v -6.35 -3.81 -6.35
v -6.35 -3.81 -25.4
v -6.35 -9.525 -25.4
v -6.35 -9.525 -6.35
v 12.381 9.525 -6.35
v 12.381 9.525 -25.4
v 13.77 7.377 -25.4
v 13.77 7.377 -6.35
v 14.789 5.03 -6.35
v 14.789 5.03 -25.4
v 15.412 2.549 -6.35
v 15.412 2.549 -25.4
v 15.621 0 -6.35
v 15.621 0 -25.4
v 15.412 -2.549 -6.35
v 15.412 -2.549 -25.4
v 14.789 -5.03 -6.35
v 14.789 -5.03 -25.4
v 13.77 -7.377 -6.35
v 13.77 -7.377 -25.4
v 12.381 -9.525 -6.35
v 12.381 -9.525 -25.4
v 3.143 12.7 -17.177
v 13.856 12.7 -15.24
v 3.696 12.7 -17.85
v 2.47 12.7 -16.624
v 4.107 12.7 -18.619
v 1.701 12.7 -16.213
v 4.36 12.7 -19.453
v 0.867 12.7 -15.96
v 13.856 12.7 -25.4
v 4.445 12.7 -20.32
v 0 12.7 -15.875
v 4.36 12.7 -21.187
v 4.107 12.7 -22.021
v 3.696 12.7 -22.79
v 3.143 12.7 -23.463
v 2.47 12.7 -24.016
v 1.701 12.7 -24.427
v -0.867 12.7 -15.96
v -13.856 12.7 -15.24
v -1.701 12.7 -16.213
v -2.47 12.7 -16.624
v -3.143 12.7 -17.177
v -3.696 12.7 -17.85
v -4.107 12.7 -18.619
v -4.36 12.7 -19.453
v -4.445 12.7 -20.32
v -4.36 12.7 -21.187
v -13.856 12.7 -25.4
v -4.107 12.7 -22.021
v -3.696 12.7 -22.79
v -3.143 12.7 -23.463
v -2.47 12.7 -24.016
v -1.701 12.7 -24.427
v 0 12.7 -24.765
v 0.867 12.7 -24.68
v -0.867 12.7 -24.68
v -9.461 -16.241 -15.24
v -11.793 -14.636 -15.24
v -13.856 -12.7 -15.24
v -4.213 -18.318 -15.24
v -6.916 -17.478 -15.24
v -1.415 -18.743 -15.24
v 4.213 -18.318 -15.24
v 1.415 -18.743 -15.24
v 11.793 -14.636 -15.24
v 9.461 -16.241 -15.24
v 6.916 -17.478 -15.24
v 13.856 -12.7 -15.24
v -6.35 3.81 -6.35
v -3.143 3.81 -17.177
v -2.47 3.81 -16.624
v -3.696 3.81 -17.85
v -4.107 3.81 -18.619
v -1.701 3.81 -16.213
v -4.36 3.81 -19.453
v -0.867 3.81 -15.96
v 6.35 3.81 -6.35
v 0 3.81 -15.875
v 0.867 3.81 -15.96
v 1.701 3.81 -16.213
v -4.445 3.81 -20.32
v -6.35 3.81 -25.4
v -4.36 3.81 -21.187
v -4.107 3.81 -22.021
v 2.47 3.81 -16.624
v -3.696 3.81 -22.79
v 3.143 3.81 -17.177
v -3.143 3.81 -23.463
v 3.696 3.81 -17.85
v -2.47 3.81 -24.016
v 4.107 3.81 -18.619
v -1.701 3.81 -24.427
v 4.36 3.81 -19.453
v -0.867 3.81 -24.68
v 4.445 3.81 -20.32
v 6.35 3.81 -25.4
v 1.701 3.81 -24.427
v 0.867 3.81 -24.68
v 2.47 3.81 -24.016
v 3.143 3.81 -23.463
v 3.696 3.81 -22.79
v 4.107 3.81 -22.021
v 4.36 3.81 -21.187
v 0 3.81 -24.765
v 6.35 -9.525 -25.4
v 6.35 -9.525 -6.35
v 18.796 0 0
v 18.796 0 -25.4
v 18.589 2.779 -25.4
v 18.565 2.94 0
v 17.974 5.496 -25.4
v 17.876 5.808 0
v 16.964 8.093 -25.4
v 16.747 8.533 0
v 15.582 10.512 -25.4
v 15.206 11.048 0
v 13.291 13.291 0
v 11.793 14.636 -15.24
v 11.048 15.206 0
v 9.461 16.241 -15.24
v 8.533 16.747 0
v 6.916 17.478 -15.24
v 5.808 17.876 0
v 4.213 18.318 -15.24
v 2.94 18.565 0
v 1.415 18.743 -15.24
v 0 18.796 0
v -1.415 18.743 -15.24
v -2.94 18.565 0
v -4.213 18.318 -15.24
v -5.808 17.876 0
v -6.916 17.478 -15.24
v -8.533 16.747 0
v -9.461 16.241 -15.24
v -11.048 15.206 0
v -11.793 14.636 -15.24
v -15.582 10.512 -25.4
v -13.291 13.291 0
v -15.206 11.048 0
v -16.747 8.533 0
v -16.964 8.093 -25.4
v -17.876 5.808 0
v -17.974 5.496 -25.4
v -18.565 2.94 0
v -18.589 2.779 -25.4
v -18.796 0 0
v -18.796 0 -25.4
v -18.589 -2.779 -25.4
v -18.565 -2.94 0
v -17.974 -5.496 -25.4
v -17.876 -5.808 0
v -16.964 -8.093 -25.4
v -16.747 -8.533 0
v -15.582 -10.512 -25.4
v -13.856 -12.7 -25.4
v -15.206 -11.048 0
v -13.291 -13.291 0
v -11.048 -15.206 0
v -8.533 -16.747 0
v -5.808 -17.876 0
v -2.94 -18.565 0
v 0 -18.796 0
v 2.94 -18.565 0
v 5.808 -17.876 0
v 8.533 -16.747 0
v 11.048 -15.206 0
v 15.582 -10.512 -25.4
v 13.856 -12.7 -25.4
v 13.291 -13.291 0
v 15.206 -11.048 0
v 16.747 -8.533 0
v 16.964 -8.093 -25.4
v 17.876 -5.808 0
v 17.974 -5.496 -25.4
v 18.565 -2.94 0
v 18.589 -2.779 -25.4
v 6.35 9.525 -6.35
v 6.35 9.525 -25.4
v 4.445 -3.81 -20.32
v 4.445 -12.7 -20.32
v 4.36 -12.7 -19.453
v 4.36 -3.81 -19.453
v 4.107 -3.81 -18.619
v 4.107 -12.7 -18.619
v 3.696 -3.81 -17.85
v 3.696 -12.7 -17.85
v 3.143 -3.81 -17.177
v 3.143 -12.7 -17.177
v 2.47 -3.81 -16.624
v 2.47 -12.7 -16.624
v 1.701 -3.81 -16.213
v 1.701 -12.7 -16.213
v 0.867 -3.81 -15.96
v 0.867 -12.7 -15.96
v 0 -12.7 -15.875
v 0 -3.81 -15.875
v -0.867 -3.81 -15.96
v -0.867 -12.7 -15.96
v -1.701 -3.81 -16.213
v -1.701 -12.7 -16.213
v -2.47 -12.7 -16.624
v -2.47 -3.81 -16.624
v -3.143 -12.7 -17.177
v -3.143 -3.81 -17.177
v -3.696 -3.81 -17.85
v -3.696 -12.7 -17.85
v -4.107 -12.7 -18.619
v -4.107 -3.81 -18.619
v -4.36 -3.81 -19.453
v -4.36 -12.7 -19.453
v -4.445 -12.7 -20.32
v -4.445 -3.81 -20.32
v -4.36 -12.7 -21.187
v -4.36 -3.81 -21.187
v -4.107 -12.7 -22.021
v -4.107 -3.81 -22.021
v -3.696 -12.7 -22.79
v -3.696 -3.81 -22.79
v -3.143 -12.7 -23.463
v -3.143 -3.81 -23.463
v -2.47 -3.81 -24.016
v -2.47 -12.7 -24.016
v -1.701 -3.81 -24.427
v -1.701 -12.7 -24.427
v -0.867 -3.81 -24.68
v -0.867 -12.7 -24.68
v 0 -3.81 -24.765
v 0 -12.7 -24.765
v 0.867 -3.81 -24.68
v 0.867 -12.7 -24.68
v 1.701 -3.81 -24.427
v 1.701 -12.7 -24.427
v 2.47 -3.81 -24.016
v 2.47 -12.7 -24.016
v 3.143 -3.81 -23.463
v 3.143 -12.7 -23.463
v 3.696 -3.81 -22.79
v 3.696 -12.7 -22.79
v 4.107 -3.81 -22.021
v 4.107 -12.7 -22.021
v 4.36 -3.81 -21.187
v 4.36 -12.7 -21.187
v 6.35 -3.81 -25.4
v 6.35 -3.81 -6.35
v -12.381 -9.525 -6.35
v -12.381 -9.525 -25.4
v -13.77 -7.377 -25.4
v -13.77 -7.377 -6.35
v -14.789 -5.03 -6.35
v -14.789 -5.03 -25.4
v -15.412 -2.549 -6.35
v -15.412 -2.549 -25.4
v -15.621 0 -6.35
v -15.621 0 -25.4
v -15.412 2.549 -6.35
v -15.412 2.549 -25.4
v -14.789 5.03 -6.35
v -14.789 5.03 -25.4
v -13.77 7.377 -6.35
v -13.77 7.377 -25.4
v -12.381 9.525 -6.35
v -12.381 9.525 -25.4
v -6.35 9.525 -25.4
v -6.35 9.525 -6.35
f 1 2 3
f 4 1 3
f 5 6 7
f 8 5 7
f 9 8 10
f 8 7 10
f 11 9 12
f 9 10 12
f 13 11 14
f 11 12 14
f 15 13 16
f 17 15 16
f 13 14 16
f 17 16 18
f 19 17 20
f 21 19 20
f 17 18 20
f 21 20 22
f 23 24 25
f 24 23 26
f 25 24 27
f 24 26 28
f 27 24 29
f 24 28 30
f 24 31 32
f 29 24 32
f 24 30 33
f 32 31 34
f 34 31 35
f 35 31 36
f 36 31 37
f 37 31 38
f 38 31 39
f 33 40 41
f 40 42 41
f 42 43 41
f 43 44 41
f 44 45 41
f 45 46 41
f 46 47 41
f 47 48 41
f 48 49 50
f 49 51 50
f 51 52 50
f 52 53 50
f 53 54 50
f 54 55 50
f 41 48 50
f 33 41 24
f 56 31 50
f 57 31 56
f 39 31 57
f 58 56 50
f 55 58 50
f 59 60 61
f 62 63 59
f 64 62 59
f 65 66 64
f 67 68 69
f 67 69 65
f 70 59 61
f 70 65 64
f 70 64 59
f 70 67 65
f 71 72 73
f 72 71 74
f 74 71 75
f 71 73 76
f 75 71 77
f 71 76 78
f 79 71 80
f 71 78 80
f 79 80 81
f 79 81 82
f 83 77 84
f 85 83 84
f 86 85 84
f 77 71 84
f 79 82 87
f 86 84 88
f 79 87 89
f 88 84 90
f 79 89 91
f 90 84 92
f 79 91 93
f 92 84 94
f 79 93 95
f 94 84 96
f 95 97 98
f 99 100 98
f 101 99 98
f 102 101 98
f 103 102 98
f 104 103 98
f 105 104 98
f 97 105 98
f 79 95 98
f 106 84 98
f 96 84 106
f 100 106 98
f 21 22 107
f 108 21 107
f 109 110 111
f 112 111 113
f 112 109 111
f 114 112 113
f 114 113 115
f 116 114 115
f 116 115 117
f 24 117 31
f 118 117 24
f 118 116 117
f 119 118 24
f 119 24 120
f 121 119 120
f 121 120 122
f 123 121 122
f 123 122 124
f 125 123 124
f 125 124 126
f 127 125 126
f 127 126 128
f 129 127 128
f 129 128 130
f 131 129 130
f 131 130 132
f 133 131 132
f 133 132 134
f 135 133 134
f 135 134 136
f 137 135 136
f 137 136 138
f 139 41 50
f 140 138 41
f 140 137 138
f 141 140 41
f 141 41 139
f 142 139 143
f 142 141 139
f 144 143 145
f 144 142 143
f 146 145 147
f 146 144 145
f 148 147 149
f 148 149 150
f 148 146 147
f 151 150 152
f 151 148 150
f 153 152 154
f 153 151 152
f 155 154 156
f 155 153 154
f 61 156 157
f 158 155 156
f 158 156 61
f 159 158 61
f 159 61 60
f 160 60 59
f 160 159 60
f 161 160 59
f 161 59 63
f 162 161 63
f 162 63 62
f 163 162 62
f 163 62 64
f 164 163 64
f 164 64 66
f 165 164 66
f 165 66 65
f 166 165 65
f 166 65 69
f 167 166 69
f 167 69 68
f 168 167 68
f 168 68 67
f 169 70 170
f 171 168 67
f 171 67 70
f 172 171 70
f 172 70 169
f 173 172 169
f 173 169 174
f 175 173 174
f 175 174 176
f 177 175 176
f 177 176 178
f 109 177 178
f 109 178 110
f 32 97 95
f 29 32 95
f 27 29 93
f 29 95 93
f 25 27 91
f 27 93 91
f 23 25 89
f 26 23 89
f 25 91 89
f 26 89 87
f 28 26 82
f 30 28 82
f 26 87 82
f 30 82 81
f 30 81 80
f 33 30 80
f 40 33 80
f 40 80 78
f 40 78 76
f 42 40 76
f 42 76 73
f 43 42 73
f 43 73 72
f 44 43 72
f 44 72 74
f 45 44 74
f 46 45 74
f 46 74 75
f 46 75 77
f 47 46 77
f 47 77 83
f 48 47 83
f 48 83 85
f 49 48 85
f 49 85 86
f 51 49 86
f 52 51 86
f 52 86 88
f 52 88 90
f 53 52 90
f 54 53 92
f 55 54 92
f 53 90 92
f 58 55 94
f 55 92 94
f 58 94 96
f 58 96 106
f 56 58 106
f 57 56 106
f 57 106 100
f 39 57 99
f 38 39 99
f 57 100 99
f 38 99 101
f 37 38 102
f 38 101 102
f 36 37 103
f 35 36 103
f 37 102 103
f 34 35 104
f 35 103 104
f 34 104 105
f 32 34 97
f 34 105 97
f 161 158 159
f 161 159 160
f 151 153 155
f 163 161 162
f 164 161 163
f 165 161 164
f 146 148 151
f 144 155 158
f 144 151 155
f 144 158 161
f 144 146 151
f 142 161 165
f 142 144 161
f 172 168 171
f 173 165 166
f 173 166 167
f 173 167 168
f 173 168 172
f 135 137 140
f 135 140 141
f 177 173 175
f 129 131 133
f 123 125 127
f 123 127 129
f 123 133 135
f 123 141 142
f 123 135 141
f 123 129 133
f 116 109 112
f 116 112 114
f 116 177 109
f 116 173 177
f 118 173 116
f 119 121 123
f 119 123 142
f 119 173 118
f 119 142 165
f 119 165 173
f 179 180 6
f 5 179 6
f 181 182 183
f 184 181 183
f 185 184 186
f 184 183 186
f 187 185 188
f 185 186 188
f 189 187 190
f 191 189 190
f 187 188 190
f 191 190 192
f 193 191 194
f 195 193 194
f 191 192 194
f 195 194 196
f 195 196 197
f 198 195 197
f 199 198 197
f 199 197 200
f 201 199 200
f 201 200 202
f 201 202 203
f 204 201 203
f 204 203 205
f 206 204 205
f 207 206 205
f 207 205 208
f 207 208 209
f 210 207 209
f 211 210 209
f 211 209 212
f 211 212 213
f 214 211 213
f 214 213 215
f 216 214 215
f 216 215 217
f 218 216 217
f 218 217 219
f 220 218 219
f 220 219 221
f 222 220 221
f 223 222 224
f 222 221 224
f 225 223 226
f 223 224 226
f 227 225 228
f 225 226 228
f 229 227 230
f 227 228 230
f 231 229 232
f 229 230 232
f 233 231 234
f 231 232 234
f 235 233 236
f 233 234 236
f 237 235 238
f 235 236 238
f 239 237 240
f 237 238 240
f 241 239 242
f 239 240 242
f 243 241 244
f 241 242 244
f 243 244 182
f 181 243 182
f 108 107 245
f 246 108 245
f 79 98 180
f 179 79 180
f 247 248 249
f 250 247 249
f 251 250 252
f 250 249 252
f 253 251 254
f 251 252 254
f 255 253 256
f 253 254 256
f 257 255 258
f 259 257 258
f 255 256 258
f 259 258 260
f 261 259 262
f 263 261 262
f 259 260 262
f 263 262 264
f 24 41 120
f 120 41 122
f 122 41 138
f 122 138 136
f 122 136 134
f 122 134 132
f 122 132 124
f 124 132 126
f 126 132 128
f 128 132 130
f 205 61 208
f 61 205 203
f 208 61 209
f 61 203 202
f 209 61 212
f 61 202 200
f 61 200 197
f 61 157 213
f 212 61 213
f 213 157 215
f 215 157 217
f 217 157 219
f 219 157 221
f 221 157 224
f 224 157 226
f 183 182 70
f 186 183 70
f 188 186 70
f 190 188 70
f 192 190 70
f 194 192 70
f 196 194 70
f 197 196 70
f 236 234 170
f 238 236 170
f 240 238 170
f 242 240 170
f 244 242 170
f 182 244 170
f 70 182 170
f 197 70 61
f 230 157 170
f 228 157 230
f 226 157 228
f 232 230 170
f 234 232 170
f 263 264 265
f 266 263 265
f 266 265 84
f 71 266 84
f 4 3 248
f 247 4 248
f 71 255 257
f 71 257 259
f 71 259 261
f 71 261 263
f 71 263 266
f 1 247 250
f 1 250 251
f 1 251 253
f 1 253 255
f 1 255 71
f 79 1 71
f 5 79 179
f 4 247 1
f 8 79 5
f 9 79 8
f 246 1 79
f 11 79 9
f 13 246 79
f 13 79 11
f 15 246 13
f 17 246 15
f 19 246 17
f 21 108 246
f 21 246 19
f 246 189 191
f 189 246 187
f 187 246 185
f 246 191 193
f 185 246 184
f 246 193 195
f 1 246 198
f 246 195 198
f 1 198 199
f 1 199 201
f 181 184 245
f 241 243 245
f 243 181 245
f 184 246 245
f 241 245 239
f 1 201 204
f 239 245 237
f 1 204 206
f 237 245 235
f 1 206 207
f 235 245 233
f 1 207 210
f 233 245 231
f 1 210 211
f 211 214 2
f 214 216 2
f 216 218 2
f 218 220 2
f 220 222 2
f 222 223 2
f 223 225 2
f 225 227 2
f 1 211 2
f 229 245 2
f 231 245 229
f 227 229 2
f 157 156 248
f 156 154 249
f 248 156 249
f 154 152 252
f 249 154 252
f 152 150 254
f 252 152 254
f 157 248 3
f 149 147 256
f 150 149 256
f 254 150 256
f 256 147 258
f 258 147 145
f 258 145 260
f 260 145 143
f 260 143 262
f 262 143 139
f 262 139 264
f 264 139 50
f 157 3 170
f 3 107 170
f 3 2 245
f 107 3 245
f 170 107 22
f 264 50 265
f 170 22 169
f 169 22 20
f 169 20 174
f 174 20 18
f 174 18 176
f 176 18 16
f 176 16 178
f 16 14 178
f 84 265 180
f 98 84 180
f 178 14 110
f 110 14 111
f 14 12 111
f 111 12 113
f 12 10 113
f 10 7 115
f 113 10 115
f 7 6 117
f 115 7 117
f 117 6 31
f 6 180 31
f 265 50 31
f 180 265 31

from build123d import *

# Parameters (mm, degrees)
F0_R     = 18.796
F1_DEPTH = 25.4
F3_DEPTH = 10.16
F5_DEPTH = 19.05
F6_R     = 4.445
F7_DEPTH = 31.497


with BuildPart() as f1:
    # F0 (on Top) → F1 (new body)
    with BuildSketch(Plane.XY):
        Circle(F0_R)
    extrude(amount=-F1_DEPTH)

    # F2 (on face) → F3 (cut)
    with BuildSketch(Plane(origin=(0, 0, -25.4), x_dir=(1, 0, 0), z_dir=(0, 0, -1))):
        with BuildLine():
            Line((13.856393, -12.7), (-13.856393, -12.7))
            ThreePointArc((-13.856393, -12.7), (0, -18.796), (13.856393, -12.7))
        make_face()
        with BuildLine():
            Line((-13.856393, 12.7), (13.856393, 12.7))
            ThreePointArc((13.856393, 12.7), (0, 18.796), (-13.856393, 12.7))
        make_face()
    extrude(amount=-F3_DEPTH, mode=Mode.SUBTRACT)

    # F4 (on face) → F5 (cut)
    with BuildSketch(Plane(origin=(0, 0, -25.4), x_dir=(1, 0, 0), z_dir=(0, 0, -1))):
        with BuildLine():
            Line((-6.35, 9.525), (-12.381035, 9.525))
            ThreePointArc((-12.381035, 9.525), (-15.621, 0), (-12.381035, -9.525))
            Line((-12.381035, -9.525), (-6.35, -9.525))
            Line((-6.35, -9.525), (-6.35, -3.81))
            Line((-6.35, -3.81), (6.35, -3.81))
            Line((6.35, -3.81), (6.35, -9.525))
            Line((6.35, -9.525), (12.381035, -9.525))
            ThreePointArc((12.381035, -9.525), (15.621, 0), (12.381035, 9.525))
            Line((12.381035, 9.525), (6.35, 9.525))
            Line((6.35, 9.525), (6.35, 3.81))
            Line((6.35, 3.81), (-6.35, 3.81))
            Line((-6.35, 3.81), (-6.35, 9.525))
        make_face()
    extrude(amount=-F5_DEPTH, mode=Mode.SUBTRACT)

    # F6 (on face) → F7 (cut, through all)
    with BuildSketch(Plane.XZ.offset(12.7)):
        with Locations((0, -20.32)):
            Circle(F6_R)
    extrude(amount=-F7_DEPTH, mode=Mode.SUBTRACT)


solid = f1.part
